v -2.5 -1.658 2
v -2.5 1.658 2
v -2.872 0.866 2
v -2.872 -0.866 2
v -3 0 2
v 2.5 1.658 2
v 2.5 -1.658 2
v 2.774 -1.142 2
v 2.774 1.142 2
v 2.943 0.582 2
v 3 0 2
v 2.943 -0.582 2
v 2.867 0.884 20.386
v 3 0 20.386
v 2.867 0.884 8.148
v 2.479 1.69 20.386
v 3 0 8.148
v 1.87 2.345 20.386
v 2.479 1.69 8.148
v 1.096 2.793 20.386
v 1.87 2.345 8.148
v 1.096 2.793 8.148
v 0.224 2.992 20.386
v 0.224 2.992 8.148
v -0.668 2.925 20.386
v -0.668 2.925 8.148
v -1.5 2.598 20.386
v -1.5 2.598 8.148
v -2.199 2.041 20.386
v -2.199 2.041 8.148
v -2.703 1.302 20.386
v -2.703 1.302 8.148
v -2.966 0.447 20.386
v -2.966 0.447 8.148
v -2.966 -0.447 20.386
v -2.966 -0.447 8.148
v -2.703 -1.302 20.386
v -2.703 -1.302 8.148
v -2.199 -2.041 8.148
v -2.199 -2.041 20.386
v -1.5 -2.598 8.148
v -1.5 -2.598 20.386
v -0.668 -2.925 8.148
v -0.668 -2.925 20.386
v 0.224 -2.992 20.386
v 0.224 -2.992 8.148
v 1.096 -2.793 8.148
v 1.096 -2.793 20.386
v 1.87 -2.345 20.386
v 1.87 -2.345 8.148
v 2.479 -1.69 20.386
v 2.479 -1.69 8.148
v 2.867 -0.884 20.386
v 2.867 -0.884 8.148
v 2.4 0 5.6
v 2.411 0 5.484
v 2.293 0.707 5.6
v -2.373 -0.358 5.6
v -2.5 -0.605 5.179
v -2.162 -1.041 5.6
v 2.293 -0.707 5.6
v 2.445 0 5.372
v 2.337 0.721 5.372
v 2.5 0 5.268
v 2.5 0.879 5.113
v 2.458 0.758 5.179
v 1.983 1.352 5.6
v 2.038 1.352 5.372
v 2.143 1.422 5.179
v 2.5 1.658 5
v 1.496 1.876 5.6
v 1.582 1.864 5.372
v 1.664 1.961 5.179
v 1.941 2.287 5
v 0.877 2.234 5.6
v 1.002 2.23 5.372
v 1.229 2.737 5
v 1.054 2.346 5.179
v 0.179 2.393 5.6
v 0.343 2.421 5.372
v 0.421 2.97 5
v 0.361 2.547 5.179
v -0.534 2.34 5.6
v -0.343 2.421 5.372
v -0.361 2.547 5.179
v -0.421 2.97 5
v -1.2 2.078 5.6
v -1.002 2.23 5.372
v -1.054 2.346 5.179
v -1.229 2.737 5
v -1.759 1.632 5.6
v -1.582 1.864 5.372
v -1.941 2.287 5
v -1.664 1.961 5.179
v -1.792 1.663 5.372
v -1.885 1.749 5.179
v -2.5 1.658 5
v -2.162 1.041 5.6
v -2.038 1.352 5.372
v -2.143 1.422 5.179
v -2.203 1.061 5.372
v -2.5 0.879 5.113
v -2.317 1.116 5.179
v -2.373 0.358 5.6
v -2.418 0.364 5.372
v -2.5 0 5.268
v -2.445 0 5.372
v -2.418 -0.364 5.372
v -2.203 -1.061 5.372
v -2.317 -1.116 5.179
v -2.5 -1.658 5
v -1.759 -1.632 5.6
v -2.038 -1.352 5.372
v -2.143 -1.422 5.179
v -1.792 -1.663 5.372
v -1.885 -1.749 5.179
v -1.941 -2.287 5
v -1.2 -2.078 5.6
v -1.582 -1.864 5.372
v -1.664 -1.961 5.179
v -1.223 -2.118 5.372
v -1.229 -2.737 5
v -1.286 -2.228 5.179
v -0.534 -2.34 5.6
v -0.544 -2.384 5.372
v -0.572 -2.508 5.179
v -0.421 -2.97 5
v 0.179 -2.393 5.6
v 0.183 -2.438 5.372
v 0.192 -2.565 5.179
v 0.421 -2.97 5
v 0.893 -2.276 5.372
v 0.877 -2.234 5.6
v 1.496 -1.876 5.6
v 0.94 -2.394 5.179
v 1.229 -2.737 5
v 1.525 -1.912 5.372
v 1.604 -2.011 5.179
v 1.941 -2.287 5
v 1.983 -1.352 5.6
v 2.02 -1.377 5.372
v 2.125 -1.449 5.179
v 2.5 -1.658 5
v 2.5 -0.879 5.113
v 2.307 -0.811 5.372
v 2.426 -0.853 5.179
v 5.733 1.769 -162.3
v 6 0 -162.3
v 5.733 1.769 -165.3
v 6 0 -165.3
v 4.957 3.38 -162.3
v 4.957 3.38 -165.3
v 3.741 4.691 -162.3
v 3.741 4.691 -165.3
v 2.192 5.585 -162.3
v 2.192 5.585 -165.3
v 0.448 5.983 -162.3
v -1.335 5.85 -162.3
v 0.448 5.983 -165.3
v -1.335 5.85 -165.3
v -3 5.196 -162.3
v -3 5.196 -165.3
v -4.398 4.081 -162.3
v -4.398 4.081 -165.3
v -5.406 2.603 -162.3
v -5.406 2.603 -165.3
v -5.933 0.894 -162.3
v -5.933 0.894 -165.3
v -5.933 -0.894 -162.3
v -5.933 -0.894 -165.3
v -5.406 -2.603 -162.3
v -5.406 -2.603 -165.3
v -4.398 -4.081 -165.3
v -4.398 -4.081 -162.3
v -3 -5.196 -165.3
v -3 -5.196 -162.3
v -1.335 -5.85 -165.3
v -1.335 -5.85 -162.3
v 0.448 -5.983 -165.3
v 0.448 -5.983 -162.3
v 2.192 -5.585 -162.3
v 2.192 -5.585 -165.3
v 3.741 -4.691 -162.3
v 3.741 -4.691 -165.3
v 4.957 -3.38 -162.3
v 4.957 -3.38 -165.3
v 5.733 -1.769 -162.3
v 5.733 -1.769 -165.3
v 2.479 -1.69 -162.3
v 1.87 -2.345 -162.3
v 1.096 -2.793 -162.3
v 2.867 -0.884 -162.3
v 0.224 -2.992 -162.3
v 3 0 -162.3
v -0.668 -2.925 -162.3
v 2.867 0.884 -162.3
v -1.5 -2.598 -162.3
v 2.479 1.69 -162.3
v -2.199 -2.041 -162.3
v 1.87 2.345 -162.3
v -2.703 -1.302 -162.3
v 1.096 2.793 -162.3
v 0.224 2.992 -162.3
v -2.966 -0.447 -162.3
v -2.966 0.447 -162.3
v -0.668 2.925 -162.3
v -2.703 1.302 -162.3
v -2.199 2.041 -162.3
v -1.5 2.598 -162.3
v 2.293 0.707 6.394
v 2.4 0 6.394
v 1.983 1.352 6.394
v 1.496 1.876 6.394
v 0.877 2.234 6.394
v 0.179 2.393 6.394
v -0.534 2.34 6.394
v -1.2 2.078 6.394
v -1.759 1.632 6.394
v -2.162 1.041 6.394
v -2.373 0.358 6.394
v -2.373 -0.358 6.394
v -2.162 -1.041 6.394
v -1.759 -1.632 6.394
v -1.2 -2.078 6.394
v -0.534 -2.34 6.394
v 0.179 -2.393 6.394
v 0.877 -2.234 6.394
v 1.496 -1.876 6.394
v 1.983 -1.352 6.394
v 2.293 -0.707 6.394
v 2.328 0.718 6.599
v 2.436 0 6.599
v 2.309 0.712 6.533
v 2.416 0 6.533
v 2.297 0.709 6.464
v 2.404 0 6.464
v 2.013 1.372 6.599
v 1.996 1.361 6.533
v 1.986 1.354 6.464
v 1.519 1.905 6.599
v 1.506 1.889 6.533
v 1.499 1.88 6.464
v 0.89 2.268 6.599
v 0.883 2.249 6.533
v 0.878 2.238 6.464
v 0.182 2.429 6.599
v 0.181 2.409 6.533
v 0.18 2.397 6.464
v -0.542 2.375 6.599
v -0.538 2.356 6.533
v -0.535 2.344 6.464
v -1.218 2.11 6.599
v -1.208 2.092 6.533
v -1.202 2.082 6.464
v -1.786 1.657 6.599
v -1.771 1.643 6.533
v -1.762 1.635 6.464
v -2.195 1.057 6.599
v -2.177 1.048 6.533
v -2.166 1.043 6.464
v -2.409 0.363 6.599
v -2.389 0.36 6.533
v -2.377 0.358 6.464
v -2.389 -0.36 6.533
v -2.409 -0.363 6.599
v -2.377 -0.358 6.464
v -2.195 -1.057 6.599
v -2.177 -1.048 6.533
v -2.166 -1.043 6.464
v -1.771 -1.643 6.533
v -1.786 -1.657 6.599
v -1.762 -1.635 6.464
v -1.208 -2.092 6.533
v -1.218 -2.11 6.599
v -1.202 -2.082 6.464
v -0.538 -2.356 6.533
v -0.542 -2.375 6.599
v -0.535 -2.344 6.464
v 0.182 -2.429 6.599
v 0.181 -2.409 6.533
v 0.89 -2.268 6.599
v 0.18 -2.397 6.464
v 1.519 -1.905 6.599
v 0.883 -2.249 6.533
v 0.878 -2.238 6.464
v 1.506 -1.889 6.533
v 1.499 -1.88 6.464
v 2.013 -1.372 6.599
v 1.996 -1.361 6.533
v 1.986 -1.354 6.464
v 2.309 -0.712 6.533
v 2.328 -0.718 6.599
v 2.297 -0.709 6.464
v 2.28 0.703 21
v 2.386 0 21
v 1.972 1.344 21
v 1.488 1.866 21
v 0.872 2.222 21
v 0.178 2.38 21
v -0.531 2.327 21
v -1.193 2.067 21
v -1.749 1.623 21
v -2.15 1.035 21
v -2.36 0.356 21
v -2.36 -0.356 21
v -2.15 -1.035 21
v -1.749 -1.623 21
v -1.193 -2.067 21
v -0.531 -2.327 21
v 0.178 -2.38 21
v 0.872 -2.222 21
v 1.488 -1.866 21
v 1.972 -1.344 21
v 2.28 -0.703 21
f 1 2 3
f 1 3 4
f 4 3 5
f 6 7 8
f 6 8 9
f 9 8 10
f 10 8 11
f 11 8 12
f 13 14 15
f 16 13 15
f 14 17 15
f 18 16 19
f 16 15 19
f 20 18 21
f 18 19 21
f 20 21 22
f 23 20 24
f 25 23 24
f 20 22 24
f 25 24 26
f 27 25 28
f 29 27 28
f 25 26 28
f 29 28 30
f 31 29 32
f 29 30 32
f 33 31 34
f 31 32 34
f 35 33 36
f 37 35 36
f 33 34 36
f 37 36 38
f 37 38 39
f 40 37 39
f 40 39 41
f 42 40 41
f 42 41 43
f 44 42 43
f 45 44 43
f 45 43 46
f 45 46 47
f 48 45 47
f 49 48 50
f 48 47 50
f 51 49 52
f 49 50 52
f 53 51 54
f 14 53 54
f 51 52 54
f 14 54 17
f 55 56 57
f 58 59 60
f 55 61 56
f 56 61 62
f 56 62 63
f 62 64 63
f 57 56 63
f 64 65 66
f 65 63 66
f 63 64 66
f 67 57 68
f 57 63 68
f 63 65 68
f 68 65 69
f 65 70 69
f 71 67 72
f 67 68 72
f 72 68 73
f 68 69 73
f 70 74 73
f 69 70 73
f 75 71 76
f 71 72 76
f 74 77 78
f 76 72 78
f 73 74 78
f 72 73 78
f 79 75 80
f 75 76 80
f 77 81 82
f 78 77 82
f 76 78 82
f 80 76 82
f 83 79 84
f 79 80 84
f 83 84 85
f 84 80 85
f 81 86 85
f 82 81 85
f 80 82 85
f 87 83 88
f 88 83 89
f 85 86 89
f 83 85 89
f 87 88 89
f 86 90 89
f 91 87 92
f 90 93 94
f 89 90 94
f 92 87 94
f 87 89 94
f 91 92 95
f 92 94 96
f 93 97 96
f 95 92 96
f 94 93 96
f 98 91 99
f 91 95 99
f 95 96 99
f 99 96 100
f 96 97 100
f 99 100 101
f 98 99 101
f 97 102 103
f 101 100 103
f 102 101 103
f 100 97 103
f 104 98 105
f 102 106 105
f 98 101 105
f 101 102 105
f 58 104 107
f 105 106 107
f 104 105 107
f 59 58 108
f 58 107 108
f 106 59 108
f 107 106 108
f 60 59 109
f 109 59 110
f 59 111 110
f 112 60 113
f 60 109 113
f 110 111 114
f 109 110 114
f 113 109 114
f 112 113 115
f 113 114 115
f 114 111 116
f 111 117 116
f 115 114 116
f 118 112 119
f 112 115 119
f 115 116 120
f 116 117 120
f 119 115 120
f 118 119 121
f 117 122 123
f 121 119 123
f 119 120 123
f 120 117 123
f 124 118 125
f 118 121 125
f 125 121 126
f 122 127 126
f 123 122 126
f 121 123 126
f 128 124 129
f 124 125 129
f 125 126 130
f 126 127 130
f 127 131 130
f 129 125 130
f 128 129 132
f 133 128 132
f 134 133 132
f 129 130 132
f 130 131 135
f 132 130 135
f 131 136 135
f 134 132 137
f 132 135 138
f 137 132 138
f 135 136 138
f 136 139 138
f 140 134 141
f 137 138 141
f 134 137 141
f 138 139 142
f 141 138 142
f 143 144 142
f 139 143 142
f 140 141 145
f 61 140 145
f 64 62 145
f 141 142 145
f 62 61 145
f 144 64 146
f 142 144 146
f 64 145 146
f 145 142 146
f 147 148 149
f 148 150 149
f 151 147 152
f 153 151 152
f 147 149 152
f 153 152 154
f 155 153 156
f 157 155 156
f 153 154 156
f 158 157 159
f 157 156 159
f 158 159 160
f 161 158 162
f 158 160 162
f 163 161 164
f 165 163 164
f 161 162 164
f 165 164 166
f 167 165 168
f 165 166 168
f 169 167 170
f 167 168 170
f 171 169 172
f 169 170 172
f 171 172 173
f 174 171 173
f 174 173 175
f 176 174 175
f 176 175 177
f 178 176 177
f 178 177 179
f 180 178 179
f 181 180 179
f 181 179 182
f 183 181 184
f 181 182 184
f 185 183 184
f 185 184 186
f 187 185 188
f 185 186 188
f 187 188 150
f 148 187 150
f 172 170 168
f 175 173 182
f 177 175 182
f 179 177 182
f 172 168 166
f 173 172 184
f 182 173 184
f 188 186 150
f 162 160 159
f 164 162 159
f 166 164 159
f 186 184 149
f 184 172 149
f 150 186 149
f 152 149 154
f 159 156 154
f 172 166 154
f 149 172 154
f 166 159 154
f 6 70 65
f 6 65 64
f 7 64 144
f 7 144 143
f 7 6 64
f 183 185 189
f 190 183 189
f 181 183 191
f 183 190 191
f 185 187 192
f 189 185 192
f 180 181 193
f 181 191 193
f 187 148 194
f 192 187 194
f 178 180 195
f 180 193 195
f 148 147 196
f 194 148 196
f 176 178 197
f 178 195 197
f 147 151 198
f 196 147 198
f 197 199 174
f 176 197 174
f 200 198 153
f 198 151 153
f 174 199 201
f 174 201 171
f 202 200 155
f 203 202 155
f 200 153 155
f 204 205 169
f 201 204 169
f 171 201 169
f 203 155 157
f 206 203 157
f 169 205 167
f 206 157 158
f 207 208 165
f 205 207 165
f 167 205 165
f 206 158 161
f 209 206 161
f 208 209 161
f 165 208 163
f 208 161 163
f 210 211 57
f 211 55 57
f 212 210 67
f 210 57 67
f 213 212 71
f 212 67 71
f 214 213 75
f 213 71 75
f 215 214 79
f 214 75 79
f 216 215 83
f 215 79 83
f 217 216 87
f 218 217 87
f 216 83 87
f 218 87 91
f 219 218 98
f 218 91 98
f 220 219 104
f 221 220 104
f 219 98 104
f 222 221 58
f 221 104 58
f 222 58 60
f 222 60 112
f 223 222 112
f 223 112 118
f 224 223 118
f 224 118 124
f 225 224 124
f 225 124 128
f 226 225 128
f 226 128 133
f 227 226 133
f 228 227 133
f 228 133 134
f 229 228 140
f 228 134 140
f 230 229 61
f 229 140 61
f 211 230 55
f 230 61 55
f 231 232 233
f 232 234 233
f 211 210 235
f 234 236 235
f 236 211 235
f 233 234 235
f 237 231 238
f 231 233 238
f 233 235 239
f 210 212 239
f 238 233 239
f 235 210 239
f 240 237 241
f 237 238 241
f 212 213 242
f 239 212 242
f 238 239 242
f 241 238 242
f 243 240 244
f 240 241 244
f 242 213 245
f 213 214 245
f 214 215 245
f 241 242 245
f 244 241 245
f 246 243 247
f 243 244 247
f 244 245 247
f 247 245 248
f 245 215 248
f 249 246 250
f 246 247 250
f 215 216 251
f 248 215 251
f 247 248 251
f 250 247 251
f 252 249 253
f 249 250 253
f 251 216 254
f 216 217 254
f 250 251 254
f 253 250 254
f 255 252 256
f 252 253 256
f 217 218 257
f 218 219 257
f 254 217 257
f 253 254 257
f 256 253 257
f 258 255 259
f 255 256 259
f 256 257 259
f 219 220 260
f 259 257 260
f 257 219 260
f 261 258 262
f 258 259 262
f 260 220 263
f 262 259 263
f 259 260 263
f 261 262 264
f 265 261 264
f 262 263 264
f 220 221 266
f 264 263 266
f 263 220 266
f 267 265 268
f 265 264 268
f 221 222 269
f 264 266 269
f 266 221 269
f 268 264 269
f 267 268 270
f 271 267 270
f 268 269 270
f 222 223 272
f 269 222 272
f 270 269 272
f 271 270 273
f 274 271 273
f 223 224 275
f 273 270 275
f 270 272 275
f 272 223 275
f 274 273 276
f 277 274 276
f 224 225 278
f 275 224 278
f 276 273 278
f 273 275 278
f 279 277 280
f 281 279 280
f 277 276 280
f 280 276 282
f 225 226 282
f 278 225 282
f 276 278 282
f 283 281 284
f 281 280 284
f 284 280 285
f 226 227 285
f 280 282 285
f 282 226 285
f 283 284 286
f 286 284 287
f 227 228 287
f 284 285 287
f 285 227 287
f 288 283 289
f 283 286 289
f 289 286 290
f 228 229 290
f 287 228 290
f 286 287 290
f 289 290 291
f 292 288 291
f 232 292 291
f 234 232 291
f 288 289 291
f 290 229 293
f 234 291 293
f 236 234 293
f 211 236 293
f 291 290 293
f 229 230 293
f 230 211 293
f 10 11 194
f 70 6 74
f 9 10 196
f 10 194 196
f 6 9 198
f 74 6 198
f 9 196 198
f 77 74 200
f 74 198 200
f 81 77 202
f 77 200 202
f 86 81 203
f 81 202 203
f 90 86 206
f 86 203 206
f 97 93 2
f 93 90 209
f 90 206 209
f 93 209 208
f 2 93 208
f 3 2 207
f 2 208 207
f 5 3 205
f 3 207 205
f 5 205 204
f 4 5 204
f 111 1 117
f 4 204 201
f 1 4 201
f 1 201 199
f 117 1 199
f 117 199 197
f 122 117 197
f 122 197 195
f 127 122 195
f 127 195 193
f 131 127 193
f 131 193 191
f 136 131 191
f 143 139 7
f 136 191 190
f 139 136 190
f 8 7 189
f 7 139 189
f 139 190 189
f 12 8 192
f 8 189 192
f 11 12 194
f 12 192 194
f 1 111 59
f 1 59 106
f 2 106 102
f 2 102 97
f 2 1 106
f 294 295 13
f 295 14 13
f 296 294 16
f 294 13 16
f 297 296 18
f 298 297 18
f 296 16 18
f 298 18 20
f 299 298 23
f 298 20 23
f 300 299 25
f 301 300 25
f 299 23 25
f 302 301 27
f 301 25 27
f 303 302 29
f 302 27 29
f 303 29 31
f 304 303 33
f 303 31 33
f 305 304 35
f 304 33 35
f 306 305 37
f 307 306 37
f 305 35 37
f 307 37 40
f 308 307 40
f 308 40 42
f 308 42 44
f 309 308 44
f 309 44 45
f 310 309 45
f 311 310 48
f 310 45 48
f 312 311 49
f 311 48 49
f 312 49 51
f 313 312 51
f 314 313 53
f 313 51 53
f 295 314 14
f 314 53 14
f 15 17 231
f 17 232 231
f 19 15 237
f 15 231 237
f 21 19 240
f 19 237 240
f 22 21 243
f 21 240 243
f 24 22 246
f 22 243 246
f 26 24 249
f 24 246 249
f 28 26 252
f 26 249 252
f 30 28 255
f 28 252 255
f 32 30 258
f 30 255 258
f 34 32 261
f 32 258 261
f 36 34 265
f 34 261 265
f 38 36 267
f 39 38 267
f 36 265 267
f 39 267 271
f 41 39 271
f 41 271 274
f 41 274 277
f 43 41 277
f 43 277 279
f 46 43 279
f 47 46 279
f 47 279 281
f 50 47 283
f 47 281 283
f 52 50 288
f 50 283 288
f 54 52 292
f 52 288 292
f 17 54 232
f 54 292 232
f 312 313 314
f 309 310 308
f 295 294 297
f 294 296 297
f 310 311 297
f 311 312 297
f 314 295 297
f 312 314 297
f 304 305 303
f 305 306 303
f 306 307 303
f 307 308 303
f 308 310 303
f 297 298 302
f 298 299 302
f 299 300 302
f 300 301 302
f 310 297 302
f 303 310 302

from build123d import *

# Parameters (mm, degrees)
SCHNITT_LINEAR_AUSTRAGEN1_DEPTH = 4


with BuildPart() as part:
    # Skizze1 → Rotation1 (revolve)
    with BuildSketch(Plane(origin=(0, 0, 0), x_dir=(0, 0, -1), z_dir=(1, 0, 0)), mode=Mode.PRIVATE) as rotation1_sk:
        Polygon((-5, 0), (-5, 3), (162.3, 3), (162.3, 6), (165.3, 6), (165.3, 0), align=None)
    revolve(rotation1_sk.sketch.rotate(Axis((0, 0, -165.3), (0, 0, 1)), 270), axis=Axis((0, 0, -165.3), (0, 0, 1)))

    # Skizze2 → Rotation2 (revolve)
    with BuildSketch(Plane(origin=(0, 0, 0), x_dir=(0, 0, -1), z_dir=(1, 0, 0)), mode=Mode.PRIVATE) as rotation2_sk:
        with BuildLine():
            Line((-21, 0), (-21, 2.3865))
            Line((-21, 2.3865), (-20.3865, 3))
            Line((-20.3865, 3), (-8.148486452, 3))
            Line((-8.148486452, 3), (-6.599415898, 2.436184428))
            ThreePointArc((-6.599415898, 2.436184428), (-6.498392718, 2.409115348), (-6.394203812, 2.4))
            Line((-6.394203812, 2.4), (-5.6, 2.4))
            ThreePointArc((-5.6, 2.4), (-5.175735931, 2.575735931), (-5, 3))
            Line((-5, 3), (-4, 3))
            Line((-4, 3), (-4, 0))
            Line((-4, 0), (-21, 0))
        make_face()
    revolve(rotation2_sk.sketch.rotate(Axis((0, 0, 4), (0, 0, 1)), 270), axis=Axis((0, 0, 4), (0, 0, 1)))

    # Skizze3 → Schnitt-Linear austragen1 (cut)
    with BuildSketch(Plane.XY.offset(2)):
        Polygon((-5, 10), (-5, -5), (-2.5, -5), (-2.5, 5), (2.5, 5), (2.5, -5), (5, -5), (5, 10), align=None)
    extrude(amount=SCHNITT_LINEAR_AUSTRAGEN1_DEPTH, mode=Mode.SUBTRACT)


solid = part.part
